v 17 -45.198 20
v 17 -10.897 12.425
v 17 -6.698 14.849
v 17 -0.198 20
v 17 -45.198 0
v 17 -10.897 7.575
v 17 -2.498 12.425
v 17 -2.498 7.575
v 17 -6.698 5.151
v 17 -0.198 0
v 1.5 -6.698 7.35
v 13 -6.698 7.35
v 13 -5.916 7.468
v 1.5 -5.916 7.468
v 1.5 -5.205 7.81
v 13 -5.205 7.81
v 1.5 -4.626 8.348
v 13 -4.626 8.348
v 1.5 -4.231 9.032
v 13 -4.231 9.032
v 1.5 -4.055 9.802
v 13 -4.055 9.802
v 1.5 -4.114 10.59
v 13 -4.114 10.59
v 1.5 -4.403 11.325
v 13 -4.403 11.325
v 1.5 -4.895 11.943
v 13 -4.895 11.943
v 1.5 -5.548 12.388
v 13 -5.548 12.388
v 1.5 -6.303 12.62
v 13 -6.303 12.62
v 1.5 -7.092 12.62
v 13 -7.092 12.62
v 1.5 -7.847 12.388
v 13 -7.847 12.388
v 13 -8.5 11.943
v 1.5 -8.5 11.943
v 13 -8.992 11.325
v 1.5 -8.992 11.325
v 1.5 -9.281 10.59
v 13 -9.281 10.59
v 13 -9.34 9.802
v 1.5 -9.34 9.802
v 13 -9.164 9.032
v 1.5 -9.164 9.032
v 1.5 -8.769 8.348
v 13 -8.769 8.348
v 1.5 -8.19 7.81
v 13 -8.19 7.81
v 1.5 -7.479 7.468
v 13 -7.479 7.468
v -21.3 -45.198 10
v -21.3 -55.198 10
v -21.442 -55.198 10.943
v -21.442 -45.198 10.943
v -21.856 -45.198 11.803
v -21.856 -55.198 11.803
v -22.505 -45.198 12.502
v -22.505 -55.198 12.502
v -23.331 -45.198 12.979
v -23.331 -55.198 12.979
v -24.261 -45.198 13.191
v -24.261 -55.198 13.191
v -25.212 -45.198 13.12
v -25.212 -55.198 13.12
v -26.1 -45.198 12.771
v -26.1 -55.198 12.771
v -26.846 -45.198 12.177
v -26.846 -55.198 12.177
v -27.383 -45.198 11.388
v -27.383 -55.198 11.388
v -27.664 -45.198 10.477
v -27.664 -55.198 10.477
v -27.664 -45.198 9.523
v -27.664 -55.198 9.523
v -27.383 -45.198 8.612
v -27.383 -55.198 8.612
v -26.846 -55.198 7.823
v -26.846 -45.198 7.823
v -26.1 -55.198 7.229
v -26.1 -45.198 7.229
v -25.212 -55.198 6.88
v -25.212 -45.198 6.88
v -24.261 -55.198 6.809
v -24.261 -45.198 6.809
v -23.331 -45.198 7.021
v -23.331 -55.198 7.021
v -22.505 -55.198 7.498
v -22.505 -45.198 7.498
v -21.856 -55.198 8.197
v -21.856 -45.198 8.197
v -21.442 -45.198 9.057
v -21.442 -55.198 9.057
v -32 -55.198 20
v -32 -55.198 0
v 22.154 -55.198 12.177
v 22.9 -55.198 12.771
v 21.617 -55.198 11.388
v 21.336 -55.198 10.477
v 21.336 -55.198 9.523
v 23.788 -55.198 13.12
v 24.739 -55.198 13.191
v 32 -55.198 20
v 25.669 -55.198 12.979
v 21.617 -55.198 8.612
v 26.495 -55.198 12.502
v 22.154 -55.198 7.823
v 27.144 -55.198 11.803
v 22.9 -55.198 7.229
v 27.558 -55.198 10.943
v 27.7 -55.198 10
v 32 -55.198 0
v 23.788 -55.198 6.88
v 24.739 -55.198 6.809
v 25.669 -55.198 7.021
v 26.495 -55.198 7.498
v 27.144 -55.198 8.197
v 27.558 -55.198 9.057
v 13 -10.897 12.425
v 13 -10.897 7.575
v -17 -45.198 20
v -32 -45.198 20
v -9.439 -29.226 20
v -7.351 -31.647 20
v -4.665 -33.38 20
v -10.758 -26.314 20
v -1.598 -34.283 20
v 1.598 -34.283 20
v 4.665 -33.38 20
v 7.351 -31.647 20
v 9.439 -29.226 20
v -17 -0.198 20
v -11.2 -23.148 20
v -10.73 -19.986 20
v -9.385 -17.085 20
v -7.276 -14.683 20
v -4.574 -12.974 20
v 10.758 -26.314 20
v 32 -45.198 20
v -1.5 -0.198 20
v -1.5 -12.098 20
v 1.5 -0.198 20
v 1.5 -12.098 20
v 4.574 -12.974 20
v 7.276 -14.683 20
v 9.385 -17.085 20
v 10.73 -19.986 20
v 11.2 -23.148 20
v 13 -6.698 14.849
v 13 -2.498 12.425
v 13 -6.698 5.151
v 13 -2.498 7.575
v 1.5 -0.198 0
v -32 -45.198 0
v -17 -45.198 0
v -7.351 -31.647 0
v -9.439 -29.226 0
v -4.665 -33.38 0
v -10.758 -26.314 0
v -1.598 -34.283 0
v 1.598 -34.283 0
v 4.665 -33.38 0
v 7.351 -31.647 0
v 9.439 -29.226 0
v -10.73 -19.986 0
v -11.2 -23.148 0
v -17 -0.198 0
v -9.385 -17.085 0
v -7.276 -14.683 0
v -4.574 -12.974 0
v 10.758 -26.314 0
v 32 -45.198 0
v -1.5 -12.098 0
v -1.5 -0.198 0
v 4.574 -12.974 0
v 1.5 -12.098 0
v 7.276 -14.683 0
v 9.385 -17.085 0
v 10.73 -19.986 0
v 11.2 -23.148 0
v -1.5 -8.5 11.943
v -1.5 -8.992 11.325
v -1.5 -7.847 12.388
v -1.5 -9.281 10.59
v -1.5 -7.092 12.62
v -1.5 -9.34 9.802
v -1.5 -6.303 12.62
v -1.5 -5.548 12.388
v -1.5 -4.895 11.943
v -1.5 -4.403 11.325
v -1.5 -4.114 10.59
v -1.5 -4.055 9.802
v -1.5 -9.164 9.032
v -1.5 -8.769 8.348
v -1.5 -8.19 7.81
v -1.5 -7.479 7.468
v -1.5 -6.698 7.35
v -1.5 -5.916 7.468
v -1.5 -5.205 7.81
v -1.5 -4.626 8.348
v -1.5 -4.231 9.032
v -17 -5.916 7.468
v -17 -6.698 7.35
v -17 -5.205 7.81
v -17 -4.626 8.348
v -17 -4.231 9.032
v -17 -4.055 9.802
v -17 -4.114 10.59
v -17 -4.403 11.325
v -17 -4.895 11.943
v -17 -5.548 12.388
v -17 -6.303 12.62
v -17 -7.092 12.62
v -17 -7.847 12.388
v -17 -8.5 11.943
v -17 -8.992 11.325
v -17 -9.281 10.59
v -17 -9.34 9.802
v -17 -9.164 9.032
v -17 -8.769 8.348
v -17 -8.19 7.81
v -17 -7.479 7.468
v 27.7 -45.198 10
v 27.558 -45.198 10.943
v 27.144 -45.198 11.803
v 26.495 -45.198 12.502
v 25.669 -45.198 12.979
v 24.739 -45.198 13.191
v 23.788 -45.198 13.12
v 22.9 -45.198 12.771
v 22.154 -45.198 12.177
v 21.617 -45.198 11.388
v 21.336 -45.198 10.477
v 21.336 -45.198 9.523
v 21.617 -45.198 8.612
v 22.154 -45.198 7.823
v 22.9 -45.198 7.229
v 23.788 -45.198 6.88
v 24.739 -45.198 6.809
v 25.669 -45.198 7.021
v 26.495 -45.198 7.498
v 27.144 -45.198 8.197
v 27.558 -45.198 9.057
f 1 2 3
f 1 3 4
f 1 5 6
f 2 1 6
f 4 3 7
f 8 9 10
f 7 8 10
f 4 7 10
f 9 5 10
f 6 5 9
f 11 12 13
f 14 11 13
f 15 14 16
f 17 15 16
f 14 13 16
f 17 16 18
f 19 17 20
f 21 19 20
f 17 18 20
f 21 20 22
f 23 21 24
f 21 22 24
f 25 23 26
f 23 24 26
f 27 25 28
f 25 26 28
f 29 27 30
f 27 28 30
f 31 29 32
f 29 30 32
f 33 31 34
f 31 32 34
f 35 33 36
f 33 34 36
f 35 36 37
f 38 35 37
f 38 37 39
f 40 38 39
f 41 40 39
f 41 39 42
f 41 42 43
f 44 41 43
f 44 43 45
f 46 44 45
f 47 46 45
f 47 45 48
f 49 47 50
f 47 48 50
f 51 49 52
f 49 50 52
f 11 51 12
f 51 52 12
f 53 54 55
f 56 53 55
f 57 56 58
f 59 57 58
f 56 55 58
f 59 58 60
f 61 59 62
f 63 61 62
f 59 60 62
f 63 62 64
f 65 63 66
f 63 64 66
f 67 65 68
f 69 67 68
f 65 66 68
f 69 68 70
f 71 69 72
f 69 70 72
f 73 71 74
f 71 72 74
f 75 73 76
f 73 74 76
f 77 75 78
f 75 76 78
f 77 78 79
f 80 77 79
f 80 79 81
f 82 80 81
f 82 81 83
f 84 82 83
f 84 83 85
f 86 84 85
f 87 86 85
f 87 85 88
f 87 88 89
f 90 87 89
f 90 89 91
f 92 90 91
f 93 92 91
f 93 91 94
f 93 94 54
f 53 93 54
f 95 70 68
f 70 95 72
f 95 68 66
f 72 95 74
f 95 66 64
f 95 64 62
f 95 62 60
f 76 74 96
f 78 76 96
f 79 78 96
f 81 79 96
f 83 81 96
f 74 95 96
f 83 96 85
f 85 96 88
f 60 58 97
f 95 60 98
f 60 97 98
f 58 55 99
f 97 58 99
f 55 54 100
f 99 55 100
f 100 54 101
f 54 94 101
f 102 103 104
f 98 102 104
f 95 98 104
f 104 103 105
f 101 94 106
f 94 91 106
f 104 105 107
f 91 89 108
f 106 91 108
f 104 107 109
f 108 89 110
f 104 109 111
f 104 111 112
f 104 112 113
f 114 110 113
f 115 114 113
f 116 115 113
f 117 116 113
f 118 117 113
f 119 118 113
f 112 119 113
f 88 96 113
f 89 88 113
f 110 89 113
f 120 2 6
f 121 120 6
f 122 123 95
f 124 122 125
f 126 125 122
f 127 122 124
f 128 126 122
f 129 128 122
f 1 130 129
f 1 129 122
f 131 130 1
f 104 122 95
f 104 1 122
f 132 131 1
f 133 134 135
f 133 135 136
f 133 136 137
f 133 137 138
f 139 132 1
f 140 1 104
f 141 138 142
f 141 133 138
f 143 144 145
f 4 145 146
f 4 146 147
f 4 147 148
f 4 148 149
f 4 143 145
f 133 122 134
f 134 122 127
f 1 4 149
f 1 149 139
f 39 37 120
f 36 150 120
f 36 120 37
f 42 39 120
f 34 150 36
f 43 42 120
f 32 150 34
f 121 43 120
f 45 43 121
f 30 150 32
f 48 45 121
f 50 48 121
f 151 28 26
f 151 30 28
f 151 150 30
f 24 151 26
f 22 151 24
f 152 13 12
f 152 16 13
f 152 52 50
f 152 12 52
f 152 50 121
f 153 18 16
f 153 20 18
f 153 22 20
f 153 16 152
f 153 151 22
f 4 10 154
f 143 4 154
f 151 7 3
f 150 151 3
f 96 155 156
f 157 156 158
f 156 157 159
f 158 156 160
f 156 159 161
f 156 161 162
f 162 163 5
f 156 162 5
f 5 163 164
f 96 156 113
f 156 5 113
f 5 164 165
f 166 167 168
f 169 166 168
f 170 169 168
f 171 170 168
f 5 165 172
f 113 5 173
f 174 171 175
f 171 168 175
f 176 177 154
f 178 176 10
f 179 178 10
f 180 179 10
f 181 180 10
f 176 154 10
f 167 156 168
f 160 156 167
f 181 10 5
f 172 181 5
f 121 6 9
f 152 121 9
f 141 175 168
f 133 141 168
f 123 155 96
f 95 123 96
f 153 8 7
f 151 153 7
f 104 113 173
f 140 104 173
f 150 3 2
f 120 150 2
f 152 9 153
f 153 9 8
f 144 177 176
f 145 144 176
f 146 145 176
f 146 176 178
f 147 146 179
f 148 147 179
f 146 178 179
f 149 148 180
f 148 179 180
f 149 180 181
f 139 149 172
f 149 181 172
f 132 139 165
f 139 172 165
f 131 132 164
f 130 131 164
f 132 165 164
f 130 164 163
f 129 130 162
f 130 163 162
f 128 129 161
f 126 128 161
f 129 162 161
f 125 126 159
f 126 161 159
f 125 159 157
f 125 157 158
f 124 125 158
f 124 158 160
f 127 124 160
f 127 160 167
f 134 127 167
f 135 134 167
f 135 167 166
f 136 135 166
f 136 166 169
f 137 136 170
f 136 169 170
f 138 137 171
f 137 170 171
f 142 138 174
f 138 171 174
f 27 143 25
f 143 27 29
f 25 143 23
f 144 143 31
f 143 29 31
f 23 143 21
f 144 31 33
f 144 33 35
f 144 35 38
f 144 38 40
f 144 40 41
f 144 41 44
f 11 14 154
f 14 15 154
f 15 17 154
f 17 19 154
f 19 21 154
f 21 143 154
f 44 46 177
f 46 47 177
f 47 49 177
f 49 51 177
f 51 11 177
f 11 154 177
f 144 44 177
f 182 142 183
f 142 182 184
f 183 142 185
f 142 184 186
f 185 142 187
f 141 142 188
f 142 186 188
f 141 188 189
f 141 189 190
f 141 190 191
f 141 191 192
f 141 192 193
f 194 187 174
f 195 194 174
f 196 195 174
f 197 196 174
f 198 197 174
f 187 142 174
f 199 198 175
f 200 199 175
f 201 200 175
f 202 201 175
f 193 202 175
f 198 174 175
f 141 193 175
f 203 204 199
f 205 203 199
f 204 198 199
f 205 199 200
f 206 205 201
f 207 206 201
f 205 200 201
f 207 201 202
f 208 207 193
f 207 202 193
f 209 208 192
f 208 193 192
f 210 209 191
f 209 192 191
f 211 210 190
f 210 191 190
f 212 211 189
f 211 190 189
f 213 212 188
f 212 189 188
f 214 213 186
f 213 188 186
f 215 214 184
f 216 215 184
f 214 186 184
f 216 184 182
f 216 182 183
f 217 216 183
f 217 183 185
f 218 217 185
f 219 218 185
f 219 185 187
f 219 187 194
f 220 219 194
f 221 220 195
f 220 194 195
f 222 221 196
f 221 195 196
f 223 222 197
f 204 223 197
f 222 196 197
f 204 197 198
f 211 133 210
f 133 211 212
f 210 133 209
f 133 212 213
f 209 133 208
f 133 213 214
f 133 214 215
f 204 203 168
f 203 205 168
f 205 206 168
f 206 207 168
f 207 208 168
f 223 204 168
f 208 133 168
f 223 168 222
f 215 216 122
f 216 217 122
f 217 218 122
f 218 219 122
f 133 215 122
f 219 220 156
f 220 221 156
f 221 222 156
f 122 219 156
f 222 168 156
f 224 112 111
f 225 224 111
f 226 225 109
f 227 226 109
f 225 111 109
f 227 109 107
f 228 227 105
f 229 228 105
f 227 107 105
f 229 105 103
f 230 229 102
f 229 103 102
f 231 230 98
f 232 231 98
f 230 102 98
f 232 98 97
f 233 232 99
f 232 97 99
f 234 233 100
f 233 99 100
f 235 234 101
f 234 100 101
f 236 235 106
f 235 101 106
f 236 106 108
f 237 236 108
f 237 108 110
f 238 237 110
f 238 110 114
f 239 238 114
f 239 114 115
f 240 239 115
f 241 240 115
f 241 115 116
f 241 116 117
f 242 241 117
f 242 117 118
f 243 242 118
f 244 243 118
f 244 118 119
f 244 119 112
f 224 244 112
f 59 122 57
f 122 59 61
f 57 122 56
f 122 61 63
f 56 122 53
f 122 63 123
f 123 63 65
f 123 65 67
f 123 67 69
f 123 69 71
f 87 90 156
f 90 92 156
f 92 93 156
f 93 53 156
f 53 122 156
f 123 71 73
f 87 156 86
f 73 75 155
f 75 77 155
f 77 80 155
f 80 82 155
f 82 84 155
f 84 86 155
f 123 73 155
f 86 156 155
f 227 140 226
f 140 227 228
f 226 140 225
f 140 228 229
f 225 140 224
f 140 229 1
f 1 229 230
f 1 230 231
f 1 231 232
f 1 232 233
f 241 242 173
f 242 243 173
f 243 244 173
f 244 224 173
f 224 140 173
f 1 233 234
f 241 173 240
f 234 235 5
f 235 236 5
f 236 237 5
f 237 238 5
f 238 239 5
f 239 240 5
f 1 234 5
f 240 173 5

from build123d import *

# Parameters (mm, degrees)
EXTRUDE_1_DEPTH     = 20
SKETCH_2_R          = 2.65
CUT_EXTRUDE_1_DEPTH = 20
CUT_EXTRUDE_2_DEPTH = 4
SKETCH_5_R          = 3.2
CUT_EXTRUDE_3_DEPTH = 56


with BuildPart() as part:
    # 草图1 → 凸台-拉伸1 (new body)
    with BuildSketch(Plane.XY):
        with BuildLine():
            Line((17, -0.197530864), (1.5, -0.197530864))
            Line((1.5, -0.197530864), (1.5, -12.098431802))
            ThreePointArc((1.5, -12.098431802), (0, -34.397530864), (-1.5, -12.098431802))
            Line((-1.5, -12.098431802), (-1.5, -0.197530864))
            Line((-1.5, -0.197530864), (-17, -0.197530864))
            Line((-17, -0.197530864), (-17, -45.197530864))
            Line((-17, -45.197530864), (-32, -45.197530864))
            Line((-32, -45.197530864), (-32, -55.197530864))
            Line((-32, -55.197530864), (32, -55.197530864))
            Line((32, -55.197530864), (32, -45.197530864))
            Line((32, -45.197530864), (17, -45.197530864))
            Line((17, -45.197530864), (17, -0.197530864))
        make_face()
    extrude(amount=EXTRUDE_1_DEPTH)

    # 草图2 → 切除-拉伸1 (cut, symmetric)
    with BuildSketch(Plane(origin=(0, 0, 0), x_dir=(0, 0, -1), z_dir=(1, 0, 0))):
        with Locations((-10, -6.697530864)):
            Circle(SKETCH_2_R)
    extrude(amount=CUT_EXTRUDE_1_DEPTH, both=True, mode=Mode.SUBTRACT)

    # 草图3 → 切除-拉伸2 (cut)
    with BuildSketch(Plane(origin=(17, 0, 0), x_dir=(0, 0, -1), z_dir=(1, 0, 0))):
        Polygon((-5.150756421, -6.697530864), (-7.575378211, -2.497962736), (-12.424621789, -2.497962736), (-14.849243579, -6.697530864), (-12.424621789, -10.897098992), (-7.575378211, -10.897098992), align=None)
    extrude(amount=-CUT_EXTRUDE_2_DEPTH, mode=Mode.SUBTRACT)

    # 草图5 → 切除-拉伸3 (cut, through all)
    with BuildSketch(Plane.XZ.offset(55.197530864)):
        with Locations((-24.5, 10)):
            Circle(SKETCH_5_R)
        with Locations((24.5, 10)):
            Circle(SKETCH_5_R)
    extrude(amount=-CUT_EXTRUDE_3_DEPTH, mode=Mode.SUBTRACT)


solid = part.part
